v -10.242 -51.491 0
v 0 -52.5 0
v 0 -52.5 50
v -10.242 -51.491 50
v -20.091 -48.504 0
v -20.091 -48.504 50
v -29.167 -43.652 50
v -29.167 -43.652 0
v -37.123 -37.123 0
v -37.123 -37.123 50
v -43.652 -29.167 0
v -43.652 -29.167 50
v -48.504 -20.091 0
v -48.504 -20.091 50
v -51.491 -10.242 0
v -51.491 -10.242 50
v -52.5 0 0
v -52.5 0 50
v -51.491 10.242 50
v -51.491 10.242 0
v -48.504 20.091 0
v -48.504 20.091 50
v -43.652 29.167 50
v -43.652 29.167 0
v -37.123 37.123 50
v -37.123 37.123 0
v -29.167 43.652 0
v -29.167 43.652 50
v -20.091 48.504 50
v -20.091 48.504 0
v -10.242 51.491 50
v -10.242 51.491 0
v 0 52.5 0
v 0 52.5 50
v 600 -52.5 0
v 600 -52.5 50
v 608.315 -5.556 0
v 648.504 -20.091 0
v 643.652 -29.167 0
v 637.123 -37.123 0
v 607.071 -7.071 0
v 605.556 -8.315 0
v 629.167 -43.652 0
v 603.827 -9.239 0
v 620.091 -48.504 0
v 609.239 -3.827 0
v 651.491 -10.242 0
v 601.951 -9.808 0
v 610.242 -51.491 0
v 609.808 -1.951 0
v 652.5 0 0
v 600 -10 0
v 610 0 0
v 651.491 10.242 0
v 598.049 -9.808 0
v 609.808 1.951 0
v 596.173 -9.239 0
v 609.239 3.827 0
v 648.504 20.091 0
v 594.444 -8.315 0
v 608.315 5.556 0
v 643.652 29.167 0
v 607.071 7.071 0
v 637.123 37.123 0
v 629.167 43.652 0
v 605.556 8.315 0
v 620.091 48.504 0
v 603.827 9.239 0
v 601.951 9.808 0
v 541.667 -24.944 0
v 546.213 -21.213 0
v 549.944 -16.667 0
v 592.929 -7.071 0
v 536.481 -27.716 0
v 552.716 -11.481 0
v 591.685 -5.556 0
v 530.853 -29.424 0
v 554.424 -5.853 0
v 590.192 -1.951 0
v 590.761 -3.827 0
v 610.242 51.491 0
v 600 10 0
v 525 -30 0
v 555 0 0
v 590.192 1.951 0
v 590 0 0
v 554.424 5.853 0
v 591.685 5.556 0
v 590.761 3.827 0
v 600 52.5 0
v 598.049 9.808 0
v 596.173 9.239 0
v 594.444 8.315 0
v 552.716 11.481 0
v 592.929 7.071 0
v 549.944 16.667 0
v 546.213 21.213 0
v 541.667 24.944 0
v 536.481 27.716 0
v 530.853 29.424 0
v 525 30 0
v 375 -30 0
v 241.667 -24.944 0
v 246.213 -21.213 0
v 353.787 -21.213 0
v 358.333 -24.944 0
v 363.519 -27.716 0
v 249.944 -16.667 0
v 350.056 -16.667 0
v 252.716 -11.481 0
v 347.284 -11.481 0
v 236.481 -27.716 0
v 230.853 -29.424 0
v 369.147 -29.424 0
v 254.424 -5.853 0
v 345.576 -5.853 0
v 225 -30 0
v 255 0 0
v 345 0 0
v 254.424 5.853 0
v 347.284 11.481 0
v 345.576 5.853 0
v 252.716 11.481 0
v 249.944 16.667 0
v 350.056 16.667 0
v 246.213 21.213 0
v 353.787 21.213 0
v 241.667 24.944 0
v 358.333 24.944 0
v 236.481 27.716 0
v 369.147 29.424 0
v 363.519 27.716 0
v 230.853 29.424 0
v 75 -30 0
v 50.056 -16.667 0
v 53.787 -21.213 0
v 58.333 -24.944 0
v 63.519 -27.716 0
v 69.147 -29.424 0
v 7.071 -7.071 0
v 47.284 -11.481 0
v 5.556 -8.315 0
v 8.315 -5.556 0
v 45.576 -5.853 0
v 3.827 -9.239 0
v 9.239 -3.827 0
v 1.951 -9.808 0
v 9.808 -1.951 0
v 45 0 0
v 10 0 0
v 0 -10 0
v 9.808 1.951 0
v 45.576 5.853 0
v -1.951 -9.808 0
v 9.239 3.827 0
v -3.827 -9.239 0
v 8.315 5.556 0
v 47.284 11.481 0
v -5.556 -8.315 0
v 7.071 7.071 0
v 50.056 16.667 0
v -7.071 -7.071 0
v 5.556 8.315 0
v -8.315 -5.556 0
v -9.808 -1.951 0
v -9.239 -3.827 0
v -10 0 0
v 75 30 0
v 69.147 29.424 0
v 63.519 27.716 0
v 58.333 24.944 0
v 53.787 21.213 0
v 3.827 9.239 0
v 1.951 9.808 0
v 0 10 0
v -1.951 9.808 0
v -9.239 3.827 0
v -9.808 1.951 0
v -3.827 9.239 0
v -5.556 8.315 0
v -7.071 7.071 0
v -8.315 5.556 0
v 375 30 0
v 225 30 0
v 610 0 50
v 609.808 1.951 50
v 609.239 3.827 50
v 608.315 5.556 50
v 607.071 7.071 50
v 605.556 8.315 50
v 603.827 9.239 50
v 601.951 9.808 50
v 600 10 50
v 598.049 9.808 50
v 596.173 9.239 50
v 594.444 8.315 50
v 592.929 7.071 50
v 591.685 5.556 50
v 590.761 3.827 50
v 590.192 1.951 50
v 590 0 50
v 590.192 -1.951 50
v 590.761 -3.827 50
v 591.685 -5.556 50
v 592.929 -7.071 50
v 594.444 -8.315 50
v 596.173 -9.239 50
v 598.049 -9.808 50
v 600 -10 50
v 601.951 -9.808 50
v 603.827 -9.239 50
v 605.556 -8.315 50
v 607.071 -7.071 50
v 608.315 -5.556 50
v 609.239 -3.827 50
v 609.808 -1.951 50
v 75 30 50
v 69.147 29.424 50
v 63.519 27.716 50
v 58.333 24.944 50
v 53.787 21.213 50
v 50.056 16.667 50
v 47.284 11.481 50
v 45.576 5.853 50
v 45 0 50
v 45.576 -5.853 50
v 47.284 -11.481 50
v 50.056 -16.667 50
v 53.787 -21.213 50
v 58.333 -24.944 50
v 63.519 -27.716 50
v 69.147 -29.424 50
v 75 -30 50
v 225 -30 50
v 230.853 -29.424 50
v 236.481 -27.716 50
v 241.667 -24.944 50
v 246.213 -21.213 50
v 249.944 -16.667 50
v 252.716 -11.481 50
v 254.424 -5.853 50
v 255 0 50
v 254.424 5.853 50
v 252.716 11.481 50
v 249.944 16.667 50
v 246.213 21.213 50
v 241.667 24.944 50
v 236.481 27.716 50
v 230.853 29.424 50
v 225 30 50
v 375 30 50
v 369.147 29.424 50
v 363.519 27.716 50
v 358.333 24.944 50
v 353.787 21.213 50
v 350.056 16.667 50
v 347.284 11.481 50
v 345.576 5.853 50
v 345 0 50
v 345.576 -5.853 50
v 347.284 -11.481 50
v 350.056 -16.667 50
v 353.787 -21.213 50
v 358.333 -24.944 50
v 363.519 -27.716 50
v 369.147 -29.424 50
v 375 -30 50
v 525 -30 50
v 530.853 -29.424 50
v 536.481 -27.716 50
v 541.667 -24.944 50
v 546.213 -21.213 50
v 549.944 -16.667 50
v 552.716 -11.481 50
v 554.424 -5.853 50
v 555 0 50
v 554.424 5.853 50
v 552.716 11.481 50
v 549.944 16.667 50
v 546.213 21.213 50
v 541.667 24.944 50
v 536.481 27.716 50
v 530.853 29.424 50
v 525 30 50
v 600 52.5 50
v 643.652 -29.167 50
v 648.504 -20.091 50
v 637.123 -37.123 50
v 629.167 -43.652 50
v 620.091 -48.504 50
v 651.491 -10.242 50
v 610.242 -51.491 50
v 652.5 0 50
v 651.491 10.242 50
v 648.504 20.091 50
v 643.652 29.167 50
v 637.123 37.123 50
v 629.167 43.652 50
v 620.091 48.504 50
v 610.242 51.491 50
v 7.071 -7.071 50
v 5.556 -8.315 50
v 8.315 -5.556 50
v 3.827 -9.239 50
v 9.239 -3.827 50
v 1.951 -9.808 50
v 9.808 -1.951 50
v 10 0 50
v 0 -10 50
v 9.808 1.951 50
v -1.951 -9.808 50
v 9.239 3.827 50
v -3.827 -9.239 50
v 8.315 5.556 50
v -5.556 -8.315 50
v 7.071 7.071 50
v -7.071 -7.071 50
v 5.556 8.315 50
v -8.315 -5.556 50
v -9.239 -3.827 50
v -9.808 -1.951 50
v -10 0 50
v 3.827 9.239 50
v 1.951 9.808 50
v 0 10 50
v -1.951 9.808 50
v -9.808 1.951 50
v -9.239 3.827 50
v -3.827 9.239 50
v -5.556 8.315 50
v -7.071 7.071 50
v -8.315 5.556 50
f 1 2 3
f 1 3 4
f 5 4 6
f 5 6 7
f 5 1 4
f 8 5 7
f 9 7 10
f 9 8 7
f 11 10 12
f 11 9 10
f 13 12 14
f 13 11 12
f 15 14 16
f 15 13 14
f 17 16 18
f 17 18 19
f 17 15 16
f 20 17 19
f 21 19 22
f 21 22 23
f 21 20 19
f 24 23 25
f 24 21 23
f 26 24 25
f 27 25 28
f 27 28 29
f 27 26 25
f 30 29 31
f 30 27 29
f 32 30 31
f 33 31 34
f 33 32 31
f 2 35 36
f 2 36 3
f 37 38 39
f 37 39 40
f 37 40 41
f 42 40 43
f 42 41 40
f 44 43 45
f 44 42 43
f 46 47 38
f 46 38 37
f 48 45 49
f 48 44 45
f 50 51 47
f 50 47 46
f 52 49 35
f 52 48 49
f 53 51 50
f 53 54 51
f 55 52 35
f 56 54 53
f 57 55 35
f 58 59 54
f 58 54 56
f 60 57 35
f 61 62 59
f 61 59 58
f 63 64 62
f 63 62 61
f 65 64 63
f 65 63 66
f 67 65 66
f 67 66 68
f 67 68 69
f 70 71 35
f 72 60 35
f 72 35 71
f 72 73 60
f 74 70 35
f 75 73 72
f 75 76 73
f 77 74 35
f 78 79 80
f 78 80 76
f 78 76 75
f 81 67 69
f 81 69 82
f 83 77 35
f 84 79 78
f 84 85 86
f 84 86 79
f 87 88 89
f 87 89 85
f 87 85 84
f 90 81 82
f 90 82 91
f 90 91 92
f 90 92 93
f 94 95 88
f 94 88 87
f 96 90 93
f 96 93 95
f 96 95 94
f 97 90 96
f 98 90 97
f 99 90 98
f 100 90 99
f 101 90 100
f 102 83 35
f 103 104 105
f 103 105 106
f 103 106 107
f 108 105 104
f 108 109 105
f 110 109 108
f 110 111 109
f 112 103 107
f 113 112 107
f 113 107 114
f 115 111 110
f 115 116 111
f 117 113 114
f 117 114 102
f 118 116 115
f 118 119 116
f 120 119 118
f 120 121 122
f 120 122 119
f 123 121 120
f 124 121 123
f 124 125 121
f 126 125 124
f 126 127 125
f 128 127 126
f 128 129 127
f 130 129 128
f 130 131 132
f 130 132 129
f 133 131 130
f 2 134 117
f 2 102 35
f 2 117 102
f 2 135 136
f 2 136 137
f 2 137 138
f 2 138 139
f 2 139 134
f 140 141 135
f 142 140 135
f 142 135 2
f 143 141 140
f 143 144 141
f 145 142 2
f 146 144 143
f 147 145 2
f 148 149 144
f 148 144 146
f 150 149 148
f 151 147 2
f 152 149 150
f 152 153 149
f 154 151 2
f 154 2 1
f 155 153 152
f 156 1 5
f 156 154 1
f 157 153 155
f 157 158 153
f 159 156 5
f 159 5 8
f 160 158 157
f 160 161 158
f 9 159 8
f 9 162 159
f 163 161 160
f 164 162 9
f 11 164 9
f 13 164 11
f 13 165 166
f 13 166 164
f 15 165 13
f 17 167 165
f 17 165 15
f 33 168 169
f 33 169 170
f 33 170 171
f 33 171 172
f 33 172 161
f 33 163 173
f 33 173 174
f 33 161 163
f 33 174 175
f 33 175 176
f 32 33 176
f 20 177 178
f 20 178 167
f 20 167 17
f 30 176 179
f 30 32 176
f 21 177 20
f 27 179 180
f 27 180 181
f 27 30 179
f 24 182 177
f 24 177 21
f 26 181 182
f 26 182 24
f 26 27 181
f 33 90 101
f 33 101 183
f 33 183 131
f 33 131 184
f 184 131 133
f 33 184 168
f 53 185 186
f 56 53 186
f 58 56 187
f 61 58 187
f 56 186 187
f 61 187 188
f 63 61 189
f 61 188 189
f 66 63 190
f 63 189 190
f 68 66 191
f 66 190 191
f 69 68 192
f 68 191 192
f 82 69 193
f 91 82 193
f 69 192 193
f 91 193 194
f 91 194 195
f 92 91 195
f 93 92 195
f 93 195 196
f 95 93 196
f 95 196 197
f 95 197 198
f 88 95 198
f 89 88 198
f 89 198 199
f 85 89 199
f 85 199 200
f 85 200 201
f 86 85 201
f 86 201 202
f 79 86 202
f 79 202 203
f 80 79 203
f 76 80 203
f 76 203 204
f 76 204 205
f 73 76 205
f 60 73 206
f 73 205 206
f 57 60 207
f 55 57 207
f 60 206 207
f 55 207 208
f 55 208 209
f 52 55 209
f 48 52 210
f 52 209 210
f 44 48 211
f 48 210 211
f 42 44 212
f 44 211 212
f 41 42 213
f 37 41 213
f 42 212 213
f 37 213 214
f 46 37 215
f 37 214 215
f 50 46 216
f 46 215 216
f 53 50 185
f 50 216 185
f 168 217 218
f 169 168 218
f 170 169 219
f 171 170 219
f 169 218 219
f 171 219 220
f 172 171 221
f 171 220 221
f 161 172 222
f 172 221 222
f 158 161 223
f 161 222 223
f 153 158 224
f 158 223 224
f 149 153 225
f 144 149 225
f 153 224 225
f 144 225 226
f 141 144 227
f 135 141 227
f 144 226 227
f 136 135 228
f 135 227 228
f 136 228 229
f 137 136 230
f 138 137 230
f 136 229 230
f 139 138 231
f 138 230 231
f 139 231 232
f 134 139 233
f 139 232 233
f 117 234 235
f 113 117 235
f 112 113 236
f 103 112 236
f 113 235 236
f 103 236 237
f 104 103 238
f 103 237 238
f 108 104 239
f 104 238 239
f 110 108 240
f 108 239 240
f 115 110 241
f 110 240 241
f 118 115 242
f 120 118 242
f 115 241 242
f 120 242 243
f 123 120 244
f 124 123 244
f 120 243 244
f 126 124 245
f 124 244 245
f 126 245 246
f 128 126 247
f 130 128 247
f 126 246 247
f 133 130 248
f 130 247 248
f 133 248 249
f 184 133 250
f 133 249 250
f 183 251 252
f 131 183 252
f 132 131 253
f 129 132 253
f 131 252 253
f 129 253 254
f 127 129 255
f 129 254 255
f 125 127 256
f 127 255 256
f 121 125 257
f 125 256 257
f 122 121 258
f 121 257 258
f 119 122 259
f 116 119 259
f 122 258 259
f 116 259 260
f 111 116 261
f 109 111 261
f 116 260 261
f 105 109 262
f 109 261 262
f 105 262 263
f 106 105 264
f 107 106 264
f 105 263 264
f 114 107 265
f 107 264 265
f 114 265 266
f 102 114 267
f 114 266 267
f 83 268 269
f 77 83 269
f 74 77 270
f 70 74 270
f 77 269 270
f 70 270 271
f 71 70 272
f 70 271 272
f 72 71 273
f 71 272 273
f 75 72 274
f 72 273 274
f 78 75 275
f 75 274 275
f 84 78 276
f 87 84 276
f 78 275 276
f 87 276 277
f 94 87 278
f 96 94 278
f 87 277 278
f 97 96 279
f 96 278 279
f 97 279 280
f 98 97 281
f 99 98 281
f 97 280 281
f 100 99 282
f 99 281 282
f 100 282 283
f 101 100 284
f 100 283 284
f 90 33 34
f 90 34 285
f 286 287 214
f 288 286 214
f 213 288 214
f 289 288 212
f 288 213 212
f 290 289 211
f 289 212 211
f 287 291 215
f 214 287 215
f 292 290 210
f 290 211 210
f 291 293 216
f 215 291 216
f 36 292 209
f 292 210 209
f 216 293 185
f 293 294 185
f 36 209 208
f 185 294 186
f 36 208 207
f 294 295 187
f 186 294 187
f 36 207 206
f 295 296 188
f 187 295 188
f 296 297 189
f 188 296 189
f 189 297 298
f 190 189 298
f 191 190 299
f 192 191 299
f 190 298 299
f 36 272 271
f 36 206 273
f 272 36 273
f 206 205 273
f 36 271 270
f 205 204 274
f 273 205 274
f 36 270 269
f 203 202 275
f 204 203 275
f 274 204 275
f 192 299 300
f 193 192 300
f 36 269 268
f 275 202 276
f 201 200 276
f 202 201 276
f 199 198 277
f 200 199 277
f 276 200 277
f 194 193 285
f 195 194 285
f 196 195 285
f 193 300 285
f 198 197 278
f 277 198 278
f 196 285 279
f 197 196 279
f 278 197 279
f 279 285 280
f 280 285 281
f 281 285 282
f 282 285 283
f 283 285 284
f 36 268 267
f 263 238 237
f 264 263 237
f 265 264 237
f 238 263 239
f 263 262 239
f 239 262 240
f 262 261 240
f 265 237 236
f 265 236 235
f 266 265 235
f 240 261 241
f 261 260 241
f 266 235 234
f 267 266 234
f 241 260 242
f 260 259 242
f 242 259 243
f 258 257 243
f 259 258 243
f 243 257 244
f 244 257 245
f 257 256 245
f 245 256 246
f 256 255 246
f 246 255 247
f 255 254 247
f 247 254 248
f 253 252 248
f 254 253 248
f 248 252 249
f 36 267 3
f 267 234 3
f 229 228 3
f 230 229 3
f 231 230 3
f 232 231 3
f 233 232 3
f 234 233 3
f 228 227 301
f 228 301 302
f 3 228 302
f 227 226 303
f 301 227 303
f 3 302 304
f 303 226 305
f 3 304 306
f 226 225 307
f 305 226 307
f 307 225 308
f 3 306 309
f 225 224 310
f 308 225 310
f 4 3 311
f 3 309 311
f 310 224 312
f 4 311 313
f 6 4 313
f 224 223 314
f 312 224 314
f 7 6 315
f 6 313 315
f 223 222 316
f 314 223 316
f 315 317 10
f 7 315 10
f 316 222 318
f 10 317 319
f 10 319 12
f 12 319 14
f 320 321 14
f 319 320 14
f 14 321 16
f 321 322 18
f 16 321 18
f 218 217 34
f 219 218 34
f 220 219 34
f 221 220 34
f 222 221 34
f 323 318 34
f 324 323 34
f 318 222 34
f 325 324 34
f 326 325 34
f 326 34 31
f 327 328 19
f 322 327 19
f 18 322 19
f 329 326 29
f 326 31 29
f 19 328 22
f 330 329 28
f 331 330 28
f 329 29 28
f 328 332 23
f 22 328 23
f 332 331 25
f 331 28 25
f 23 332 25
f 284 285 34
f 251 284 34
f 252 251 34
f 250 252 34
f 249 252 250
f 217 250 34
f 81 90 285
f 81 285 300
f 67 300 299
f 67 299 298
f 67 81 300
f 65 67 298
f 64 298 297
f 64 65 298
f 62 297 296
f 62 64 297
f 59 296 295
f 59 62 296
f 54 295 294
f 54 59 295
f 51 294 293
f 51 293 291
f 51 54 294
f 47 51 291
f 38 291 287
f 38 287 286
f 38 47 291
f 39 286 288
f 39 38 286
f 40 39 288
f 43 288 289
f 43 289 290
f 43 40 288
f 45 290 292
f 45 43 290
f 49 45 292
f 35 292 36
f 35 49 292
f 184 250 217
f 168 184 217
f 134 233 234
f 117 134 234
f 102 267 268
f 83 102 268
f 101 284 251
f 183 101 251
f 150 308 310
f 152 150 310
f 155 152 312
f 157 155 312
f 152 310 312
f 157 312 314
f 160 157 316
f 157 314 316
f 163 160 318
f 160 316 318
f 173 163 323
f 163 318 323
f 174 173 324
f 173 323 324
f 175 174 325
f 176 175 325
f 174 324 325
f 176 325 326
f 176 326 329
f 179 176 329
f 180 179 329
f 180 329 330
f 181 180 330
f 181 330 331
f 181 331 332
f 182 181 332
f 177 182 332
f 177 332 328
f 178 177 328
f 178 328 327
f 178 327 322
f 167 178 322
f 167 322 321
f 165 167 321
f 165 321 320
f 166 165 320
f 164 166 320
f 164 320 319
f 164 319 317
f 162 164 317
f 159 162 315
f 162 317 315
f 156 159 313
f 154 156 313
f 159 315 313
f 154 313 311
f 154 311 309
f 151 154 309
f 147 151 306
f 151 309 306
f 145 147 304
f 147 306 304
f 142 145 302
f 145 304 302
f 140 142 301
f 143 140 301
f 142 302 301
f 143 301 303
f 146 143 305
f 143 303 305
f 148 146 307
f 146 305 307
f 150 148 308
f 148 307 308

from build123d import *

# Parameters (mm, degrees)
EXTRUDE_1_DEPTH     = 50
SKETCH_2_R          = 10
CUT_EXTRUDE_1_DEPTH = 657.515422515


with BuildPart() as part:
    # 草图1 → 凸台-拉伸1 (new body)
    with BuildSketch(Plane.XY):
        with BuildLine():
            Line((0, 52.5), (600, 52.5))
            ThreePointArc((600, 52.5), (652.5, 0), (600, -52.5))
            Line((600, -52.5), (0, -52.5))
            ThreePointArc((0, -52.5), (-52.5, 0), (0, 52.5))
        make_face()
    extrude(amount=EXTRUDE_1_DEPTH)

    # 草图2 → 切除-拉伸1 (cut, through all)
    with BuildSketch(Plane.XY.offset(50)):
        with BuildLine():
            Line((375, -30), (525, -30))
            ThreePointArc((525, -30), (555, 0), (525, 30))
            Line((525, 30), (375, 30))
            ThreePointArc((375, 30), (345, 0), (375, -30))
        make_face()
        with Locations((600, 0)):
            Circle(SKETCH_2_R)
        Circle(SKETCH_2_R)
        with BuildLine():
            Line((75, -30), (225, -30))
            ThreePointArc((225, -30), (255, 0), (225, 30))
            Line((225, 30), (75, 30))
            ThreePointArc((75, 30), (45, 0), (75, -30))
        make_face()
    extrude(amount=-CUT_EXTRUDE_1_DEPTH, mode=Mode.SUBTRACT)


solid = part.part
